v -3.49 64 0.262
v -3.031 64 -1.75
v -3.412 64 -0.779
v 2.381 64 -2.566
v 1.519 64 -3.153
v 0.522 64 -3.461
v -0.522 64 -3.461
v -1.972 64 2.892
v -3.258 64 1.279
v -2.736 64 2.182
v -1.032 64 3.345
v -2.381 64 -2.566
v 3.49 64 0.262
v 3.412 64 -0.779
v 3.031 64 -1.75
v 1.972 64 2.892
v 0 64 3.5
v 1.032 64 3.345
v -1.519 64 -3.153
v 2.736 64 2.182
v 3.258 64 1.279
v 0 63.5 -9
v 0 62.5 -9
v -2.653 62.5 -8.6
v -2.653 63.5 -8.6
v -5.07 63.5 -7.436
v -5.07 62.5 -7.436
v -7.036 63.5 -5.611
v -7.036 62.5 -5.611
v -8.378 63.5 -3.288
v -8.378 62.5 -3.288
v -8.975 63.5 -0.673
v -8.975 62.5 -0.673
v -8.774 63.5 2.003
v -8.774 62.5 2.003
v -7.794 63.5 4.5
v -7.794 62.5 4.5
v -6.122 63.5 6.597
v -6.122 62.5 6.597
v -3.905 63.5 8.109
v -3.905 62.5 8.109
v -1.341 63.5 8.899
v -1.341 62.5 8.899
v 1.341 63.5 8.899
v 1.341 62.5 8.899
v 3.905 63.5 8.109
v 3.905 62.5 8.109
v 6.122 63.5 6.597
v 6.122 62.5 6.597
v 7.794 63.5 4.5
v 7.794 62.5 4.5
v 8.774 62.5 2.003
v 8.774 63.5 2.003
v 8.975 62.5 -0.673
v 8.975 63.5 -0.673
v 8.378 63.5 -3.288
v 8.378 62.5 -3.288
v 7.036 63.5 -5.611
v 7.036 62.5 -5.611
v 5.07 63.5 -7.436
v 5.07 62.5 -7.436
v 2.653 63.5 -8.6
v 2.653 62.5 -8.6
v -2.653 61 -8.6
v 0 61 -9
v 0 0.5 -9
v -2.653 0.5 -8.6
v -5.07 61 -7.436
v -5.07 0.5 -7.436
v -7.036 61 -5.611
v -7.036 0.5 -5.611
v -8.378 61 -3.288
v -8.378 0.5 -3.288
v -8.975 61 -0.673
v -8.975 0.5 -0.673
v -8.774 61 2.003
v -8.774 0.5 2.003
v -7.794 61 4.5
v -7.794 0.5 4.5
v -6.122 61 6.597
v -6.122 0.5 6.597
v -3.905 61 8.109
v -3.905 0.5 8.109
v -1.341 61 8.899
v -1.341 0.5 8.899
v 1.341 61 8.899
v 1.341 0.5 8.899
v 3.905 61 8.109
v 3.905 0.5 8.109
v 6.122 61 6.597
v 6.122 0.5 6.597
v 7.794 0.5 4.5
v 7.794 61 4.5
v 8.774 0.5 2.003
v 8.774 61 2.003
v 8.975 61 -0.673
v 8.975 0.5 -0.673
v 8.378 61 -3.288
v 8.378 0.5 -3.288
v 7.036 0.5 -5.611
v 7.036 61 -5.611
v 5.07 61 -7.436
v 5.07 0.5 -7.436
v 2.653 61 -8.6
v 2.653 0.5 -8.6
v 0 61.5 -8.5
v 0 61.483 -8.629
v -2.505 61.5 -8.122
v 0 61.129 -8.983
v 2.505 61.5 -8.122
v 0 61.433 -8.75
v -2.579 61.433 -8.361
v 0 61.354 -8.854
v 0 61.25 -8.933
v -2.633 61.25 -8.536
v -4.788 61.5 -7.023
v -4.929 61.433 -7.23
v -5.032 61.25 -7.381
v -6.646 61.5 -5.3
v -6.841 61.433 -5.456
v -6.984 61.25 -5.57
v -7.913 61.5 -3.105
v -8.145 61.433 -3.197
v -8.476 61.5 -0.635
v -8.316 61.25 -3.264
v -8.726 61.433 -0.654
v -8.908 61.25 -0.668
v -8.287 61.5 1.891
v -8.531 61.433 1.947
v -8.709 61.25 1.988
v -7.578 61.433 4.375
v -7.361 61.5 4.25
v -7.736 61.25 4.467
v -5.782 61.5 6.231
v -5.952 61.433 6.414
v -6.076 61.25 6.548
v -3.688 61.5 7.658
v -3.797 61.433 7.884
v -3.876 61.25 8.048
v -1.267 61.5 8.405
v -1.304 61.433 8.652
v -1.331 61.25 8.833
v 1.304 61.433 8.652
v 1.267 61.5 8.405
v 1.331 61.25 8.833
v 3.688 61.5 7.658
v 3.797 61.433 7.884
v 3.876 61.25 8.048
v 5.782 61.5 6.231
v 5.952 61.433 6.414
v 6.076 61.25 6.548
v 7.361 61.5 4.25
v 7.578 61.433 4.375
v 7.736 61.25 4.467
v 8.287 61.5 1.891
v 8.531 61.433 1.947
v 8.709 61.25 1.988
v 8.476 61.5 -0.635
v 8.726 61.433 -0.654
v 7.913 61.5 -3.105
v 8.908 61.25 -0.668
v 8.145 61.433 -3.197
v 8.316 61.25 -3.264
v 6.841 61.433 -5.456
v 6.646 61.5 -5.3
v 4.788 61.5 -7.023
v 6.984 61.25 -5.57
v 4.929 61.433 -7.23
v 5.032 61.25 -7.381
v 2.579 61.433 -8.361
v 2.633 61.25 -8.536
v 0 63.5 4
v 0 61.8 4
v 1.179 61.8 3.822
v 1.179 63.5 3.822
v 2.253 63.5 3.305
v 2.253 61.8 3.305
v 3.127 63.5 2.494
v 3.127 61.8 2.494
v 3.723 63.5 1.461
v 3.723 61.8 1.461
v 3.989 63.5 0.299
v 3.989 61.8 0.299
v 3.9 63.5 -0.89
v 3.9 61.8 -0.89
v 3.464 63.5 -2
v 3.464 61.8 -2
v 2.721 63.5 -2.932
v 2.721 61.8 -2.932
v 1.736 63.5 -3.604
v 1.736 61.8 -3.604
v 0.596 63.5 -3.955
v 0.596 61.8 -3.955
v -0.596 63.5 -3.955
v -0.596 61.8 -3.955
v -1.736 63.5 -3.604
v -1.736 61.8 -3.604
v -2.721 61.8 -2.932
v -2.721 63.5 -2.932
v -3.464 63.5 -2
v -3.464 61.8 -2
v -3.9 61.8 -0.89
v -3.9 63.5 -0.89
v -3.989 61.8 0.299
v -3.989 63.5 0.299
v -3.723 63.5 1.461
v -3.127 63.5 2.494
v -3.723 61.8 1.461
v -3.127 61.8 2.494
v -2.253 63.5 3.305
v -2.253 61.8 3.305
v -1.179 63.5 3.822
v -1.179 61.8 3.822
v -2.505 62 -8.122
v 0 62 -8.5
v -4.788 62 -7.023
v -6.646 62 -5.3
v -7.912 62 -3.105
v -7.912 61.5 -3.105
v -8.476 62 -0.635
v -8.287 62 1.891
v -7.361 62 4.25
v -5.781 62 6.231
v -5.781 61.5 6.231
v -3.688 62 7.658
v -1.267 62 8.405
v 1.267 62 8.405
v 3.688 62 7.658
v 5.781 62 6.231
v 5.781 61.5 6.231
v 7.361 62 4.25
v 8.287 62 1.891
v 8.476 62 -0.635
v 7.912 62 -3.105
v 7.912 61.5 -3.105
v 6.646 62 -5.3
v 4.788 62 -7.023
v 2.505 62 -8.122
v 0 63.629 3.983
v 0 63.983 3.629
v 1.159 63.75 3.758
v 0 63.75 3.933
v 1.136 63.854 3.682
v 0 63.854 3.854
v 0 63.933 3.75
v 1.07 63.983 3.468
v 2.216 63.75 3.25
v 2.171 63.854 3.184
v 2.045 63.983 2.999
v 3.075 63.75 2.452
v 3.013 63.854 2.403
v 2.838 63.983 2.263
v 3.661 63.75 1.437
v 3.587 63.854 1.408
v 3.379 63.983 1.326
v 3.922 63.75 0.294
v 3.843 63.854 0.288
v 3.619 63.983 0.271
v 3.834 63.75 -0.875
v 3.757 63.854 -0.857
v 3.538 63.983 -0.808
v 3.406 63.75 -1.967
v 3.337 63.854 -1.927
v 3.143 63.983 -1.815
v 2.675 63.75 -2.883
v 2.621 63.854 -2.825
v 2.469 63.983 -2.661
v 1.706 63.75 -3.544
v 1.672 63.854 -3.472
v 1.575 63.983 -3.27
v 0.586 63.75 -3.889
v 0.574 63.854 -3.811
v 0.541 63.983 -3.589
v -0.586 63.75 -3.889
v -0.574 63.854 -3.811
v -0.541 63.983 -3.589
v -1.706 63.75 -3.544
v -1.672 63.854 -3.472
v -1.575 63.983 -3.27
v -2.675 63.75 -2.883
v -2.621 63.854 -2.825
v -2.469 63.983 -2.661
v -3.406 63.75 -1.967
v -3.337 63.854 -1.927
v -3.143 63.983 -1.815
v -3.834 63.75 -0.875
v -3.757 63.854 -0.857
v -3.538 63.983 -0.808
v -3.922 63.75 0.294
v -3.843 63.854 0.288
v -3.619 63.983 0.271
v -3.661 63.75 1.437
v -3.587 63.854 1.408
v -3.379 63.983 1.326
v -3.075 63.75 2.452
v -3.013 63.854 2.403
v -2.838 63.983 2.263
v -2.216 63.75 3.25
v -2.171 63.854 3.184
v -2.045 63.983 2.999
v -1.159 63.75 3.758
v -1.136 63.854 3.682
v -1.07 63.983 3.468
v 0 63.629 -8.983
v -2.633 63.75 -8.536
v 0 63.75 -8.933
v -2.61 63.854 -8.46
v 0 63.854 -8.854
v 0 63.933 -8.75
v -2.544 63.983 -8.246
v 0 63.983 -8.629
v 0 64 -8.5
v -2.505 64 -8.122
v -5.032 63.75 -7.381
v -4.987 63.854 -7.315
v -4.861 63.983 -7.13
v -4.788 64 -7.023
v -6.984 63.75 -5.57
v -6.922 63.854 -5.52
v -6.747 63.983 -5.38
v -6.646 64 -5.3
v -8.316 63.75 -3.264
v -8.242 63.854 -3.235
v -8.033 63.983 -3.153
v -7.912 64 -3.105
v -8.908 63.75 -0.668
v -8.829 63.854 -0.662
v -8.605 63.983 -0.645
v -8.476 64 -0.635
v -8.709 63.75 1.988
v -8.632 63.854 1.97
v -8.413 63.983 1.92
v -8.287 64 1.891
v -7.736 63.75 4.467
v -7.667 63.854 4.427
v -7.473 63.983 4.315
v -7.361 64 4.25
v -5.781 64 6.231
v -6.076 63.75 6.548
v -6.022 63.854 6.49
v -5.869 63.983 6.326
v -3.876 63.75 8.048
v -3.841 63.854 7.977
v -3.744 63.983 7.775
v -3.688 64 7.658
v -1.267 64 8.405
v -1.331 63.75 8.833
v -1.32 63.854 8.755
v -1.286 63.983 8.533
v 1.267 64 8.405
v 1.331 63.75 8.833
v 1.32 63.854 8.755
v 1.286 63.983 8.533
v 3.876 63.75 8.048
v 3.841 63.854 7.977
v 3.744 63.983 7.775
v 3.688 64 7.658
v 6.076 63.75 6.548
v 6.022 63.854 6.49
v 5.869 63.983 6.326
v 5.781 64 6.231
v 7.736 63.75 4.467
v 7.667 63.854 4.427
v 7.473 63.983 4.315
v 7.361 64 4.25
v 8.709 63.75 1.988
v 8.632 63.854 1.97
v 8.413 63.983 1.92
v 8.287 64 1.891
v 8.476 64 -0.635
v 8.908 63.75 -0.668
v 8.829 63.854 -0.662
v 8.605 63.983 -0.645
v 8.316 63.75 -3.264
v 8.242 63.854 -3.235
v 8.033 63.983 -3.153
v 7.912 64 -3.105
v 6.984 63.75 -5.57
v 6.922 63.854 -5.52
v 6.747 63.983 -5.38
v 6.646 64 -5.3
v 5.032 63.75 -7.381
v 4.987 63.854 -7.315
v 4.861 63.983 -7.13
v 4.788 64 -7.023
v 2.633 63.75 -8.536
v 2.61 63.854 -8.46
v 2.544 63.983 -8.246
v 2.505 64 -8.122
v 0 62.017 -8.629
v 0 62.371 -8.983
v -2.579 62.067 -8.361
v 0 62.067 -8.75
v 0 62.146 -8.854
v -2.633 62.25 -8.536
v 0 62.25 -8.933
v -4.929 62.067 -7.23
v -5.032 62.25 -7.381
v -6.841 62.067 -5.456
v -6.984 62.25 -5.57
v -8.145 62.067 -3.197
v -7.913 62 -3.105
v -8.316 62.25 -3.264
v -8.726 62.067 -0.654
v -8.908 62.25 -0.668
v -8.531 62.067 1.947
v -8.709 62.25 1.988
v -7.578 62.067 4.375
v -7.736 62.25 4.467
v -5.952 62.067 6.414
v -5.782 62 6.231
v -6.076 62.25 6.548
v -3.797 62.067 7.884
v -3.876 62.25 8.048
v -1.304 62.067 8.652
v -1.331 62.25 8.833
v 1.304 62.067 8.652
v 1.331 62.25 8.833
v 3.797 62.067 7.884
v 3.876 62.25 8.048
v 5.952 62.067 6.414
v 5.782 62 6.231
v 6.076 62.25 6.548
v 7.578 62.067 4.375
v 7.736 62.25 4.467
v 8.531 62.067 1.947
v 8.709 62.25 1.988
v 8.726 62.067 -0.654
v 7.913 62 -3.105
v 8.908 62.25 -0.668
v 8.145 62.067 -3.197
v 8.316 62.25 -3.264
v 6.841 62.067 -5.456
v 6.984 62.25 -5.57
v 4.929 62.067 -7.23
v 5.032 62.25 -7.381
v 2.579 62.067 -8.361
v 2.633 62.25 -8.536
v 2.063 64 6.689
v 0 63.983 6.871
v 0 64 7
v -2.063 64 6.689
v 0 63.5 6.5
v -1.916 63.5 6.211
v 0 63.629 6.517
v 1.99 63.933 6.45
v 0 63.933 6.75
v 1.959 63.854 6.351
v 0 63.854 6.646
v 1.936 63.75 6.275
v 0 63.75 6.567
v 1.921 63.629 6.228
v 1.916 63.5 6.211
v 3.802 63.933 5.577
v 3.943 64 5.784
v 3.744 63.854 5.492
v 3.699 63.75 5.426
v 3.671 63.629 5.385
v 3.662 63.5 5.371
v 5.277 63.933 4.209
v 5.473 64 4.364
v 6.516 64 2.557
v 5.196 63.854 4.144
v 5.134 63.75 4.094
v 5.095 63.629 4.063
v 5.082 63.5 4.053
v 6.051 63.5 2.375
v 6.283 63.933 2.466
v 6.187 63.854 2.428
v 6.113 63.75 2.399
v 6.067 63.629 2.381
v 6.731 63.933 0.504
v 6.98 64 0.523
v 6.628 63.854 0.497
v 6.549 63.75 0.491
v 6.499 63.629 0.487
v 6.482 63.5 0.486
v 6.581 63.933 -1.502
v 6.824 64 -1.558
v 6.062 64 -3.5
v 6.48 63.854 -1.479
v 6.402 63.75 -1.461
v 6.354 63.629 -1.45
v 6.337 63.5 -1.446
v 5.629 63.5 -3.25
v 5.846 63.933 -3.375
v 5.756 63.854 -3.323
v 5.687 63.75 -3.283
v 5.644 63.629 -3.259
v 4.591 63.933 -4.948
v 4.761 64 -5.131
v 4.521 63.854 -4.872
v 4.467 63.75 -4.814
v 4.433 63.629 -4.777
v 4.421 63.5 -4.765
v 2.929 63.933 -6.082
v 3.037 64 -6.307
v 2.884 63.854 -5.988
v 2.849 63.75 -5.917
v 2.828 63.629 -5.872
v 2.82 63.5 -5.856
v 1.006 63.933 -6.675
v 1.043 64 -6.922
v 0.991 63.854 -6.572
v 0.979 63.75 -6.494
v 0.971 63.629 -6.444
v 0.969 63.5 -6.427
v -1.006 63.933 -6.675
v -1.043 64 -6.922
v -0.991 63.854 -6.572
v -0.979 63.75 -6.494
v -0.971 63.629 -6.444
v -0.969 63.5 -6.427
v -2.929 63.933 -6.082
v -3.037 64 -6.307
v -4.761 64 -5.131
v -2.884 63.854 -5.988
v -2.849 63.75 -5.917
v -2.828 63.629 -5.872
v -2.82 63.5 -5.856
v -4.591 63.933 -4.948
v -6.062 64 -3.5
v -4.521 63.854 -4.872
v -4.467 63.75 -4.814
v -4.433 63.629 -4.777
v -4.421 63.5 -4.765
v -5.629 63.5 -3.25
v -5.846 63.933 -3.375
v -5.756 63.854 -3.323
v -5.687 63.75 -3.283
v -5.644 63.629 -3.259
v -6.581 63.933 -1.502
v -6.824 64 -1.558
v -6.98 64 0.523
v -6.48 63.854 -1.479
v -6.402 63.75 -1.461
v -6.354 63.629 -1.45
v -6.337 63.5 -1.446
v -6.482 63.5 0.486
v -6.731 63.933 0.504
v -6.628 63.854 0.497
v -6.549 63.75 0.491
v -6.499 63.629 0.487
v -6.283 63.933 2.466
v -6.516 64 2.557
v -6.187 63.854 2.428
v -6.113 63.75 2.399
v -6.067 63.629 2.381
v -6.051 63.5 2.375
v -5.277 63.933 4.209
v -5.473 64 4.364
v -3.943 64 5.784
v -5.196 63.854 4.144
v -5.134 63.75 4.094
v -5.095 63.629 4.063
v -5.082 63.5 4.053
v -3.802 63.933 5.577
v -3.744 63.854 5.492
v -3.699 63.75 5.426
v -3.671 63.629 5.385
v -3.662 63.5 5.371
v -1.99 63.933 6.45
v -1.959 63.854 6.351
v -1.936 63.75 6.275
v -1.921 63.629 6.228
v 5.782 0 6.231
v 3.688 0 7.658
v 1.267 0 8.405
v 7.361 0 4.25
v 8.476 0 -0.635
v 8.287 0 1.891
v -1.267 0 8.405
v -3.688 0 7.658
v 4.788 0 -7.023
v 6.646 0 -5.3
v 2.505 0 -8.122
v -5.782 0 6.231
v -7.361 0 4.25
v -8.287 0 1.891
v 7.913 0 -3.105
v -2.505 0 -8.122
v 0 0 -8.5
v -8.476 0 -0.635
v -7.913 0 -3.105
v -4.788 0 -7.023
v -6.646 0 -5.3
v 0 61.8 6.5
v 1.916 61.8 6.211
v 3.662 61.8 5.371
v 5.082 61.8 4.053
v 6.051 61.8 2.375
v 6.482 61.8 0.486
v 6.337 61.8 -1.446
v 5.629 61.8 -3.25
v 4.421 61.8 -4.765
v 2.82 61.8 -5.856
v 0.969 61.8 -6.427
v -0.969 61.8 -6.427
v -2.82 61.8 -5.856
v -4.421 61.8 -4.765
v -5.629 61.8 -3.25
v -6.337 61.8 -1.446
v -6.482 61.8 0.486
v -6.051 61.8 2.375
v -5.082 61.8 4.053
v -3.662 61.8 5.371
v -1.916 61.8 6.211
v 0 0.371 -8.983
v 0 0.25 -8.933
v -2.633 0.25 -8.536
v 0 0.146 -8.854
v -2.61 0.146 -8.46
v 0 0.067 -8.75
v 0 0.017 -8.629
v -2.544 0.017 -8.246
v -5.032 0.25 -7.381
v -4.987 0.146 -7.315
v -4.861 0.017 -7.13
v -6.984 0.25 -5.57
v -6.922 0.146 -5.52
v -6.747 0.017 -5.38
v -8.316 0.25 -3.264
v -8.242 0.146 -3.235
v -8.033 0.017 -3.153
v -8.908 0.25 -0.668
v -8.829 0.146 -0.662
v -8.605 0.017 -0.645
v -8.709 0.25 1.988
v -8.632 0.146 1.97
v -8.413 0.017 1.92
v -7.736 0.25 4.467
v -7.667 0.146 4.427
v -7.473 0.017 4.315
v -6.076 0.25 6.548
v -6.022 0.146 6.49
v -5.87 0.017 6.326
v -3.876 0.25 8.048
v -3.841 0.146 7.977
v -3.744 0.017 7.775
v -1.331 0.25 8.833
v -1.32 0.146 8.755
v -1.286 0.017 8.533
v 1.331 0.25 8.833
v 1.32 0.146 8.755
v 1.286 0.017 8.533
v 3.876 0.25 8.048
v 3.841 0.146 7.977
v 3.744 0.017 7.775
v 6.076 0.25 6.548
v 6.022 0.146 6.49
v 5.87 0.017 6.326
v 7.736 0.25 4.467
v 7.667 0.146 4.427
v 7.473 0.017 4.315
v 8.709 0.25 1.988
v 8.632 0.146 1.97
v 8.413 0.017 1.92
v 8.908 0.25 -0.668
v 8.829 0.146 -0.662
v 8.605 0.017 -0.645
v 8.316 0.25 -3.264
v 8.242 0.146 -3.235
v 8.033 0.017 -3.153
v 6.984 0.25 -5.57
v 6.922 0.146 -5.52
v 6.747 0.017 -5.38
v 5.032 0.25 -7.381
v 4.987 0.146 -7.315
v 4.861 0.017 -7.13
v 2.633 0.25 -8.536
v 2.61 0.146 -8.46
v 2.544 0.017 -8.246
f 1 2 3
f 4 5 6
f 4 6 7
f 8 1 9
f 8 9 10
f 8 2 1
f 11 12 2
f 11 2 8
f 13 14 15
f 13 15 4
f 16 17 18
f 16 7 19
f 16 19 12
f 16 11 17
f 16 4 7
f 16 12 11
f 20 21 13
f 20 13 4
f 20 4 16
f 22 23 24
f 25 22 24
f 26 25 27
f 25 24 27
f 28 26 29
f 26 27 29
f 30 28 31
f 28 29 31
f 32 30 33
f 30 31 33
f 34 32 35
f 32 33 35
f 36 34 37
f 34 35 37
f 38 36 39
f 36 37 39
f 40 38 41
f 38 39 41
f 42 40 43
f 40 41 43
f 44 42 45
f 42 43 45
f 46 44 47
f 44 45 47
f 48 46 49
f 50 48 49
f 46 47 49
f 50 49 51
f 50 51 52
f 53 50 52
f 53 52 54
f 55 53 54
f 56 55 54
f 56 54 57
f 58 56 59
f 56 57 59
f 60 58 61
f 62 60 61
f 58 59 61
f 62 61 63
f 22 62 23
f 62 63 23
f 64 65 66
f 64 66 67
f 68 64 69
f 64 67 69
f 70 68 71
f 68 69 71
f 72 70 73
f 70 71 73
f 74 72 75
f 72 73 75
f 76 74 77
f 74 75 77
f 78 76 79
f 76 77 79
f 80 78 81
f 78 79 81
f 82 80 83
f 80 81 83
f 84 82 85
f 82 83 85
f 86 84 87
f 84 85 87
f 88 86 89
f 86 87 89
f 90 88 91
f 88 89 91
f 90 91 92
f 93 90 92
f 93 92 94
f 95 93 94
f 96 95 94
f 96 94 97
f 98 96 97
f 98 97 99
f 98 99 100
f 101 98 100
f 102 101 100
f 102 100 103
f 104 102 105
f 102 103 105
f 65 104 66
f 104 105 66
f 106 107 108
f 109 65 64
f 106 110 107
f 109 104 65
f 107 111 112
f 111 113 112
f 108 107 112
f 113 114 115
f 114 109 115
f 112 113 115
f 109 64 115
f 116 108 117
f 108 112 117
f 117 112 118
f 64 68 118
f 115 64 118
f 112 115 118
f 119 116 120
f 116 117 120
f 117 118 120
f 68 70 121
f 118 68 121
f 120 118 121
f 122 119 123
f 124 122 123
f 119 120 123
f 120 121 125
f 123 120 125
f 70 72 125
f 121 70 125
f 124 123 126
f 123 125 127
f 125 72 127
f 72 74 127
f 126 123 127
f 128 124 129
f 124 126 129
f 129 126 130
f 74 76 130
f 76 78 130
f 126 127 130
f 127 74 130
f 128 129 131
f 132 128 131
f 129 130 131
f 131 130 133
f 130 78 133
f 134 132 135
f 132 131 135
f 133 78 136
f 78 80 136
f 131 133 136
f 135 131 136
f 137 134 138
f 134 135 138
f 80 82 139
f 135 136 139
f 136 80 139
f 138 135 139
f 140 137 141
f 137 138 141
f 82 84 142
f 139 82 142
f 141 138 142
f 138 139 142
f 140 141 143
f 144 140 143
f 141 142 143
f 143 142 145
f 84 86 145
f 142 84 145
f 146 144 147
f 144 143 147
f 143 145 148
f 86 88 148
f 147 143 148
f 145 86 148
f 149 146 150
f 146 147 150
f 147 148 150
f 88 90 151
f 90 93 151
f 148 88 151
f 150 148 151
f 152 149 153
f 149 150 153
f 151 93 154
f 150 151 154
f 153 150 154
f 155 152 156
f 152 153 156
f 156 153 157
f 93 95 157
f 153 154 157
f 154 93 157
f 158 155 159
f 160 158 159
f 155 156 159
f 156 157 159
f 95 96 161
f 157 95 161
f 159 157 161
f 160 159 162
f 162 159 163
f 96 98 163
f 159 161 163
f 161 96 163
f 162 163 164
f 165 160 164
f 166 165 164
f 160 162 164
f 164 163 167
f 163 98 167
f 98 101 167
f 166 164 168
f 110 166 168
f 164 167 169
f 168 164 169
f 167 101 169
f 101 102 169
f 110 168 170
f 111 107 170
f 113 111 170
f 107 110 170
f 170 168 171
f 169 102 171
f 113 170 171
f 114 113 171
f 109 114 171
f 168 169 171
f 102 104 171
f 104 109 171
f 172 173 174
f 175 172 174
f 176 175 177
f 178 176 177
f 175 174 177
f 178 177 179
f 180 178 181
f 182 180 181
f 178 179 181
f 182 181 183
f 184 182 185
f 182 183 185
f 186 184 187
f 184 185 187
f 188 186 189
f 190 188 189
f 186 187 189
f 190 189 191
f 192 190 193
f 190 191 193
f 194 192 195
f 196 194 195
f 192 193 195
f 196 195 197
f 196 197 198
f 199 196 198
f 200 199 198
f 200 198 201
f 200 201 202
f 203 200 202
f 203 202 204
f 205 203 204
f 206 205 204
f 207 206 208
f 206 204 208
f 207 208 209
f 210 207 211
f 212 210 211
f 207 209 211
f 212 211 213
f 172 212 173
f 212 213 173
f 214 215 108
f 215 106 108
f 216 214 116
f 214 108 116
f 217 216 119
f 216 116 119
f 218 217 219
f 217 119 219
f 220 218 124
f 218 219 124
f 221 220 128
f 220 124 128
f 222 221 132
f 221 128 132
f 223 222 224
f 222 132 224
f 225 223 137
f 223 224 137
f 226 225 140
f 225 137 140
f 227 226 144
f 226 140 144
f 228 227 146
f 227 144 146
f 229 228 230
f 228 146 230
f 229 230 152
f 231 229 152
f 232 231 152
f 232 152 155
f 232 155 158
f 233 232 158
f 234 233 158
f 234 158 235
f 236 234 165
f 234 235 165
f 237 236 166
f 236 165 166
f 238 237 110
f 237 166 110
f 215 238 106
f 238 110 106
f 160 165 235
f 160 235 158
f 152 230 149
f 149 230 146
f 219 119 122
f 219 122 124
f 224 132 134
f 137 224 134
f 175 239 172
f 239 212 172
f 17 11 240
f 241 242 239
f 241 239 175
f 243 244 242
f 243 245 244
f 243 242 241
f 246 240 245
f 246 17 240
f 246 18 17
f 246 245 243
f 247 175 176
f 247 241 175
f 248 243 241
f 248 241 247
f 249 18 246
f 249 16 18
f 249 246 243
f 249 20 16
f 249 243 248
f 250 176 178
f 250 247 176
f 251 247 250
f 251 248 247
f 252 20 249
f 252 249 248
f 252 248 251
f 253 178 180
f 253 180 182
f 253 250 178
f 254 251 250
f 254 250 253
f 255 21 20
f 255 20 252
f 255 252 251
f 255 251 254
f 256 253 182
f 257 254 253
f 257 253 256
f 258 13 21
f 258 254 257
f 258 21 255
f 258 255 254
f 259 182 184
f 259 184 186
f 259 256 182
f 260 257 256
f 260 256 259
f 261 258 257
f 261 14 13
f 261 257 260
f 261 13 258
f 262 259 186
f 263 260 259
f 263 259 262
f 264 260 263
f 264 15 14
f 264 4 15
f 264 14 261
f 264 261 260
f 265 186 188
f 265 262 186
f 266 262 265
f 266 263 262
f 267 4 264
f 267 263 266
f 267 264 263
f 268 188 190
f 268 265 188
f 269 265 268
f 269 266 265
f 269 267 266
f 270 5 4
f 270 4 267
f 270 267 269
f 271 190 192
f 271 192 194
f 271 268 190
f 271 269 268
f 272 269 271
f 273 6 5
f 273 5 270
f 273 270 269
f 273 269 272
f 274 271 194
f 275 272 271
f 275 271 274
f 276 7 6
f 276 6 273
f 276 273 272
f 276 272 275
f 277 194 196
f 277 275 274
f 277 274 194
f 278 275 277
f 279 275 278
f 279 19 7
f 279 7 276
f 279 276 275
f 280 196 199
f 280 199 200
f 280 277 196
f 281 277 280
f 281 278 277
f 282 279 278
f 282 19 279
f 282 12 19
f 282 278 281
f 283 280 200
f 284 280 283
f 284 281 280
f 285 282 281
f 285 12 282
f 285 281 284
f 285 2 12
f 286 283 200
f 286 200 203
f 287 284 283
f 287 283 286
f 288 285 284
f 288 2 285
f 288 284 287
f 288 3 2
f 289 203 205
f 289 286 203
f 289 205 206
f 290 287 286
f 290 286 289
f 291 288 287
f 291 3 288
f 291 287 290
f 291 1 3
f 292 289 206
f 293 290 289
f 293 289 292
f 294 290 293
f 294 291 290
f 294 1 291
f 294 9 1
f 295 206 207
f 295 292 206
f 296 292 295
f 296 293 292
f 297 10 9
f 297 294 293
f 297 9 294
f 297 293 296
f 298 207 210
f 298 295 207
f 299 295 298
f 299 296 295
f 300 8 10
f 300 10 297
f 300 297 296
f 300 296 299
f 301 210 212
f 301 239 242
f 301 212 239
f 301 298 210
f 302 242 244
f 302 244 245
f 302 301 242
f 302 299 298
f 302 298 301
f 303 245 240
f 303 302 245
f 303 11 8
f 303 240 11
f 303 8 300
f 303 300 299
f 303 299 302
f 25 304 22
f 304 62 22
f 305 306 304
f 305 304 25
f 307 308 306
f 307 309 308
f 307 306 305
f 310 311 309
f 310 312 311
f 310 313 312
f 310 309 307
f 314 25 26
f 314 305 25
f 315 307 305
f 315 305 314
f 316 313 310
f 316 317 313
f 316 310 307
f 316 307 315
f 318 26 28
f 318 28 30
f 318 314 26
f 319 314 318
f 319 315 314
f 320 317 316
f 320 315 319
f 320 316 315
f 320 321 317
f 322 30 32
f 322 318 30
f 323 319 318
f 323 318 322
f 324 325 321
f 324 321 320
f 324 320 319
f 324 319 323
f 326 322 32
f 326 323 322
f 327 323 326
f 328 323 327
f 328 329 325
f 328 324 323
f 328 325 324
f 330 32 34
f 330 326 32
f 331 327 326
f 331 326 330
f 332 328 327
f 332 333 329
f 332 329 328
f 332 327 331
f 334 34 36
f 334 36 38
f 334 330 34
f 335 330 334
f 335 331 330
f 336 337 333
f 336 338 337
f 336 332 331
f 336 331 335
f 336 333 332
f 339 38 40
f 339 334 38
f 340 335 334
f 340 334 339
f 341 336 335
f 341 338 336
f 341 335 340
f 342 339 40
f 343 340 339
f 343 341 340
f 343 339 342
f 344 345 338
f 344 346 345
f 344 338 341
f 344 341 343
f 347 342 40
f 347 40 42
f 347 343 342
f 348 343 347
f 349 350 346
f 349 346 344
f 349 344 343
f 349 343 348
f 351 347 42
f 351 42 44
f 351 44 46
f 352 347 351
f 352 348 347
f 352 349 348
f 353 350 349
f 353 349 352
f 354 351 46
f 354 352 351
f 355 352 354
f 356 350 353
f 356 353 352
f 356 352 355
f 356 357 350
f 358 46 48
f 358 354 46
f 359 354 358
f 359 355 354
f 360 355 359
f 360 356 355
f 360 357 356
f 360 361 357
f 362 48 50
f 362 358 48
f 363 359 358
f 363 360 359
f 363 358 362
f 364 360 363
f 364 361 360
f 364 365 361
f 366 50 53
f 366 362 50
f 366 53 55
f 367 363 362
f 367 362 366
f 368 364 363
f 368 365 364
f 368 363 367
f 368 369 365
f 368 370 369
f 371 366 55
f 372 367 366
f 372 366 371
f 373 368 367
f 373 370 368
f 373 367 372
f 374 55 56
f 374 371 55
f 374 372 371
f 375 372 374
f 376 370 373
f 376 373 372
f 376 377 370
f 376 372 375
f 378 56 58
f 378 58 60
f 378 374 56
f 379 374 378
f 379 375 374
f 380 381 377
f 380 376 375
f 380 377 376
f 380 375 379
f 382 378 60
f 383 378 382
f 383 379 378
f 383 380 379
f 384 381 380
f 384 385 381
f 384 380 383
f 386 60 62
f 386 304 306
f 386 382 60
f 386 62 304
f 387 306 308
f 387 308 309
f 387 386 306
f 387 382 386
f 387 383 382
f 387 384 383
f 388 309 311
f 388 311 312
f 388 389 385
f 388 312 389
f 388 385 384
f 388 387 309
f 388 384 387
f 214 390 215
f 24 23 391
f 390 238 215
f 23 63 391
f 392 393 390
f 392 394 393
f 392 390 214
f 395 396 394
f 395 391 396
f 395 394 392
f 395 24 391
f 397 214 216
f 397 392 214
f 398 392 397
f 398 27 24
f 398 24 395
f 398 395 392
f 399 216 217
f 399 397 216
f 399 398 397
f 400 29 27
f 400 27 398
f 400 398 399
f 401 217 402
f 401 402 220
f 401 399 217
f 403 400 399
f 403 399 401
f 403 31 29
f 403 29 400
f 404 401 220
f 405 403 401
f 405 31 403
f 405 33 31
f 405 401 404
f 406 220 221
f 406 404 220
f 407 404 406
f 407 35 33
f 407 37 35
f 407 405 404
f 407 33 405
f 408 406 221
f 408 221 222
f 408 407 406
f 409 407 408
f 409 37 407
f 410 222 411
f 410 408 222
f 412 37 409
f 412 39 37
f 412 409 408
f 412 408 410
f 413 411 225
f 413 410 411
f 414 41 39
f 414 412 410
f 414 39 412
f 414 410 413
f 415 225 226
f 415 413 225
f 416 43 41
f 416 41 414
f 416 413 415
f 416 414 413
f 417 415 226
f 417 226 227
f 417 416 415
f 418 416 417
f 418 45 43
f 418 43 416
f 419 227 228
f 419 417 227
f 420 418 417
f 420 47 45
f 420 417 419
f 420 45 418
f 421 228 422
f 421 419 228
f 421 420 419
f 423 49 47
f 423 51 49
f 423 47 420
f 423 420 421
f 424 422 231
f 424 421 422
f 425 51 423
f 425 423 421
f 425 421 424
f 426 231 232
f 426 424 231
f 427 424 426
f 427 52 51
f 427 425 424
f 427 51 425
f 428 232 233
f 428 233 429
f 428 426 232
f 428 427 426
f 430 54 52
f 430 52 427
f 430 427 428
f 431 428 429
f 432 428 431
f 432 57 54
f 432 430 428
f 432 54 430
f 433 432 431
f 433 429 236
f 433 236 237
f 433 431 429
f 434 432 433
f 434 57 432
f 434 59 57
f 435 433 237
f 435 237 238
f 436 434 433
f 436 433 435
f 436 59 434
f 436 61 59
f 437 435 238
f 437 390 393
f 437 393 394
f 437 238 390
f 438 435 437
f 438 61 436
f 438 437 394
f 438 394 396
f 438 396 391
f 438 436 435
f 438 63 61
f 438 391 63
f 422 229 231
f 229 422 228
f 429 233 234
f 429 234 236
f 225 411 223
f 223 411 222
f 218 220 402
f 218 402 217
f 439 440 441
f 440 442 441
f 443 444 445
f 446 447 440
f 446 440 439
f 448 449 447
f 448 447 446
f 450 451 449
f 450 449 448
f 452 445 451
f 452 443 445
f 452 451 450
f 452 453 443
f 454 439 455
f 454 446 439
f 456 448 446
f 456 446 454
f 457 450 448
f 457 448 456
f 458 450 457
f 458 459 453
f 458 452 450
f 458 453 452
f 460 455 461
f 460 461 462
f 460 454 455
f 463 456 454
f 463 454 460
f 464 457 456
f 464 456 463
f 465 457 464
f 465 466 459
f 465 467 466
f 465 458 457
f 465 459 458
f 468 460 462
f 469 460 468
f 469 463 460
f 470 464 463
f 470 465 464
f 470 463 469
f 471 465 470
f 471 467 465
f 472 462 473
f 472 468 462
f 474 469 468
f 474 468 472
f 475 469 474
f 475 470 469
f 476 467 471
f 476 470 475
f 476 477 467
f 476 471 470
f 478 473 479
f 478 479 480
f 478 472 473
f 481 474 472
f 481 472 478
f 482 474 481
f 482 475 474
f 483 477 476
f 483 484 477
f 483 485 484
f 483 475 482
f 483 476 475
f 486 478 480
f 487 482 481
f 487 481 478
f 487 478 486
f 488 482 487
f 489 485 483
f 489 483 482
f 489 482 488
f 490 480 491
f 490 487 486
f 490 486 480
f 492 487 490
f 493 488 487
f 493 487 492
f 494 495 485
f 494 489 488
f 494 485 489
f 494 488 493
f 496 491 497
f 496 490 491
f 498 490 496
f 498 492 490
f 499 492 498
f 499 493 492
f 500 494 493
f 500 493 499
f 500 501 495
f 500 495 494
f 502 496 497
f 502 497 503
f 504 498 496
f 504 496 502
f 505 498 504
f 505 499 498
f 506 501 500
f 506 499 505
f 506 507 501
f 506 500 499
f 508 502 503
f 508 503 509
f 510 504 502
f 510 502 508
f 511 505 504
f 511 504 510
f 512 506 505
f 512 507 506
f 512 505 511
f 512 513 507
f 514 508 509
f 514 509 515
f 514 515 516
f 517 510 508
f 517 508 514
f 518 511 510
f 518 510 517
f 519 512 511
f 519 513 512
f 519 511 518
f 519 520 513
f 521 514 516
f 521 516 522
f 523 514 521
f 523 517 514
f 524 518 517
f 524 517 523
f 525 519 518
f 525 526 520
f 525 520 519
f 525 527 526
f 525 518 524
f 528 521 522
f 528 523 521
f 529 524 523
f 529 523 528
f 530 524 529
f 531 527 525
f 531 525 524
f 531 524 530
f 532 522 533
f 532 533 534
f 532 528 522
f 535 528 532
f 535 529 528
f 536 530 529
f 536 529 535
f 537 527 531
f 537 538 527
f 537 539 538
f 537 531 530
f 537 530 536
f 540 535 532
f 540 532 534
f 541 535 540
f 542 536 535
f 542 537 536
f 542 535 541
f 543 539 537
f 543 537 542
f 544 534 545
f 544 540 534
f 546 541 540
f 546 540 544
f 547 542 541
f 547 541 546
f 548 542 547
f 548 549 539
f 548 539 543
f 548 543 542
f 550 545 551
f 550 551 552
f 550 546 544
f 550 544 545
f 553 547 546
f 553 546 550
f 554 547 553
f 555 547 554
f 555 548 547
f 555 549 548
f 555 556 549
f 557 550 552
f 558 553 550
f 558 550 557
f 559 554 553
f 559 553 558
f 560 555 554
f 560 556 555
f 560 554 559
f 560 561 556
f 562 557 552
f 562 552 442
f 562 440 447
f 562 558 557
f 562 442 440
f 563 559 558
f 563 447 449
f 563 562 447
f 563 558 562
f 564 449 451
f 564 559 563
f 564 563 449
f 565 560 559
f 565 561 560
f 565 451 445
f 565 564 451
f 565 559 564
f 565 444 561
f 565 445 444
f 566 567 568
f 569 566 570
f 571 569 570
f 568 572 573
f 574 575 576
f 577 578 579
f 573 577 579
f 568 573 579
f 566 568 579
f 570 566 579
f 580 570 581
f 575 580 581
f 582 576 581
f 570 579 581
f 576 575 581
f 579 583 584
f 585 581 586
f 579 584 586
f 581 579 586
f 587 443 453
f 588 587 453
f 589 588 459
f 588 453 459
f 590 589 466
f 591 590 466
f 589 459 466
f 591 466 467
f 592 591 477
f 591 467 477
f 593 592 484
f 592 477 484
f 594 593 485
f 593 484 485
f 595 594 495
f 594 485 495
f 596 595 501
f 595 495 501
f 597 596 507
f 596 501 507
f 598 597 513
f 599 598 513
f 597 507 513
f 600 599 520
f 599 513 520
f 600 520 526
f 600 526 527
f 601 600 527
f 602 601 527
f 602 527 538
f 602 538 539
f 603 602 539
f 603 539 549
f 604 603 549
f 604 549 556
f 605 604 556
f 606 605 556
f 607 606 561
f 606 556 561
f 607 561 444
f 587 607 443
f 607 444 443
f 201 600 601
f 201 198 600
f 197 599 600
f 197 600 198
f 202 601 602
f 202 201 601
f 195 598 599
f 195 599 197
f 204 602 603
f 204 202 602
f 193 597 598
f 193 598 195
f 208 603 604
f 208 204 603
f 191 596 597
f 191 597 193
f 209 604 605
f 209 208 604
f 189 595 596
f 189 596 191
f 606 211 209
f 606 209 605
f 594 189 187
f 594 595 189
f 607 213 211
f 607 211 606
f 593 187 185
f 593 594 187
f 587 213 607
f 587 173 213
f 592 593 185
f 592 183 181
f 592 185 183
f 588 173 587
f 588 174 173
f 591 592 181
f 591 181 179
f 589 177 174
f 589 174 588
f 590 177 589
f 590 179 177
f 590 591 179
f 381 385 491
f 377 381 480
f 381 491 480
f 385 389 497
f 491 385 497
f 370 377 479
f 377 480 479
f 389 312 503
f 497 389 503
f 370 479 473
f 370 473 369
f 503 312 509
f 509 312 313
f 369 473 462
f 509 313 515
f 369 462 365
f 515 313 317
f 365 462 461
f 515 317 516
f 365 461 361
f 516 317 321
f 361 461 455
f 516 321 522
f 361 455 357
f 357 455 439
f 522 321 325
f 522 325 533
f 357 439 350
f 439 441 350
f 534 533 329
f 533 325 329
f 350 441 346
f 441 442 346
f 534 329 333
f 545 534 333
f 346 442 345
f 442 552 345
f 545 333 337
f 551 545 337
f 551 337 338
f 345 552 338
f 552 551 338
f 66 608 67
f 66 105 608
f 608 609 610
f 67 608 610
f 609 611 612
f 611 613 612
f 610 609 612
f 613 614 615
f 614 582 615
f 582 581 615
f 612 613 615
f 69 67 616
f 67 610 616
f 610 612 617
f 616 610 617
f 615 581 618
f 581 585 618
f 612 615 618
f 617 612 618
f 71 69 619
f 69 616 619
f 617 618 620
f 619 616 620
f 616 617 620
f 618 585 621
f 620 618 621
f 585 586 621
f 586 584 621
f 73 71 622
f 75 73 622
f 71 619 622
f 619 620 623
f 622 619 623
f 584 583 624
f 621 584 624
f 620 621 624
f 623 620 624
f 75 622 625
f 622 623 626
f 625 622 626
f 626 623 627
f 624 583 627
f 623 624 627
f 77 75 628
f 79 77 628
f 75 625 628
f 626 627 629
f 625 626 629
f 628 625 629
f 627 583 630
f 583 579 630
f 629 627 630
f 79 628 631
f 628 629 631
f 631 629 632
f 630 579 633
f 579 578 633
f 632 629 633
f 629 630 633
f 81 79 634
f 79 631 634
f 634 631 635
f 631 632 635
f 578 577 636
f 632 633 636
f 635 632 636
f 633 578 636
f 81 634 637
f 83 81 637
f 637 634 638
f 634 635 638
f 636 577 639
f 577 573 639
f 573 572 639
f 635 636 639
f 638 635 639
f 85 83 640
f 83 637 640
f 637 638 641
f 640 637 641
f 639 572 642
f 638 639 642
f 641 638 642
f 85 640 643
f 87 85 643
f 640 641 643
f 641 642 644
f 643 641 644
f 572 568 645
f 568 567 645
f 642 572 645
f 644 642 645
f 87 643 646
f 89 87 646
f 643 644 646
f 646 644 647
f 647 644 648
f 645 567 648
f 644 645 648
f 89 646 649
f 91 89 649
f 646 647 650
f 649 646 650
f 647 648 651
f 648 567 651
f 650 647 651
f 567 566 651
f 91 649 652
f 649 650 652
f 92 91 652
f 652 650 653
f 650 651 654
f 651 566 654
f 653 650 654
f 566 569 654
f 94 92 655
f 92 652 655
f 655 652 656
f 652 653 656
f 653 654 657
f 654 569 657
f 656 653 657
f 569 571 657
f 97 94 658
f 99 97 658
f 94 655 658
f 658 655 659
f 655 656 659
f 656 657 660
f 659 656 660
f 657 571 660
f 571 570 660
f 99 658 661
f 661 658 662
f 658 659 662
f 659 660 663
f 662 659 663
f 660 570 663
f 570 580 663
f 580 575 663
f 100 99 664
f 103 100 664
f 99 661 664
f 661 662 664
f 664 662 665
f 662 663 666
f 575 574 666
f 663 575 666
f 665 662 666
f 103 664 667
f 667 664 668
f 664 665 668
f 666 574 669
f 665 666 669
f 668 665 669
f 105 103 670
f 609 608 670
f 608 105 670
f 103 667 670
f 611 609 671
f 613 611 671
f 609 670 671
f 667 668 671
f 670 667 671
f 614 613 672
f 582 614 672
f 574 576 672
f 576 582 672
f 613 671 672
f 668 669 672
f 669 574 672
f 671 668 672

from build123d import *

# Parameters (mm, degrees)
FILLET1_R           = 0.5
SKETCH4_R           = 6.5
CUT_EXTRUDE1_DEPTH  = 2.2
SKETCH5_R           = 4
BOSS_EXTRUDE1_DEPTH = 2.2
FILLET2_R           = 0.5


with BuildPart() as part:
    # Sketch2 → Revolve1 (revolve)
    with BuildSketch(Plane(origin=(0, 0, 0), x_dir=(0, 0, -1), z_dir=(1, 0, 0))):
        Polygon((9, 62), (8.5, 62), (8.5, 61.5), (9, 61.5), (9, 0), (0, 0), (0, 64), (9, 64), align=None)
    revolve(axis=Axis((0, 0, 0), (0, 1, 0)))

    # Fillet1
    fillet1_edges = [part.edges().sort_by_distance(p)[0] for p in [
        (0, 0, 9),
        (0, 61.5, 9),
        (0, 62, 9),
    ]]
    fillet(fillet1_edges, radius=FILLET1_R - 0.0001)  # a hair under: the kernel refuses the full size

    # Sketch4 → Cut-Extrude1 (cut)
    with BuildSketch(Plane(origin=(0, 64, 0), x_dir=(1, 0, 0), z_dir=(0, 1, 0))):
        with Locations(Location((0, 0, 0), (0, 0, 270))):
            Circle(SKETCH4_R)
    extrude(amount=-CUT_EXTRUDE1_DEPTH, mode=Mode.SUBTRACT)

    # Sketch5 → Boss-Extrude1 (add)
    with BuildSketch(Plane(origin=(0, 61.8, 0), x_dir=(1, 0, 0), z_dir=(0, 1, 0))):
        with Locations(Location((0, 0, 0), (0, 0, 270))):
            Circle(SKETCH5_R)
    extrude(amount=BOSS_EXTRUDE1_DEPTH)

    # Fillet2
    fillet2_edges = [part.edges().sort_by_distance(p)[0] for p in [
        (0, 64, -6.5),
        (0, 64, -4),
        (0, 64, 9),
    ]]
    fillet(fillet2_edges, radius=FILLET2_R)


solid = part.part
